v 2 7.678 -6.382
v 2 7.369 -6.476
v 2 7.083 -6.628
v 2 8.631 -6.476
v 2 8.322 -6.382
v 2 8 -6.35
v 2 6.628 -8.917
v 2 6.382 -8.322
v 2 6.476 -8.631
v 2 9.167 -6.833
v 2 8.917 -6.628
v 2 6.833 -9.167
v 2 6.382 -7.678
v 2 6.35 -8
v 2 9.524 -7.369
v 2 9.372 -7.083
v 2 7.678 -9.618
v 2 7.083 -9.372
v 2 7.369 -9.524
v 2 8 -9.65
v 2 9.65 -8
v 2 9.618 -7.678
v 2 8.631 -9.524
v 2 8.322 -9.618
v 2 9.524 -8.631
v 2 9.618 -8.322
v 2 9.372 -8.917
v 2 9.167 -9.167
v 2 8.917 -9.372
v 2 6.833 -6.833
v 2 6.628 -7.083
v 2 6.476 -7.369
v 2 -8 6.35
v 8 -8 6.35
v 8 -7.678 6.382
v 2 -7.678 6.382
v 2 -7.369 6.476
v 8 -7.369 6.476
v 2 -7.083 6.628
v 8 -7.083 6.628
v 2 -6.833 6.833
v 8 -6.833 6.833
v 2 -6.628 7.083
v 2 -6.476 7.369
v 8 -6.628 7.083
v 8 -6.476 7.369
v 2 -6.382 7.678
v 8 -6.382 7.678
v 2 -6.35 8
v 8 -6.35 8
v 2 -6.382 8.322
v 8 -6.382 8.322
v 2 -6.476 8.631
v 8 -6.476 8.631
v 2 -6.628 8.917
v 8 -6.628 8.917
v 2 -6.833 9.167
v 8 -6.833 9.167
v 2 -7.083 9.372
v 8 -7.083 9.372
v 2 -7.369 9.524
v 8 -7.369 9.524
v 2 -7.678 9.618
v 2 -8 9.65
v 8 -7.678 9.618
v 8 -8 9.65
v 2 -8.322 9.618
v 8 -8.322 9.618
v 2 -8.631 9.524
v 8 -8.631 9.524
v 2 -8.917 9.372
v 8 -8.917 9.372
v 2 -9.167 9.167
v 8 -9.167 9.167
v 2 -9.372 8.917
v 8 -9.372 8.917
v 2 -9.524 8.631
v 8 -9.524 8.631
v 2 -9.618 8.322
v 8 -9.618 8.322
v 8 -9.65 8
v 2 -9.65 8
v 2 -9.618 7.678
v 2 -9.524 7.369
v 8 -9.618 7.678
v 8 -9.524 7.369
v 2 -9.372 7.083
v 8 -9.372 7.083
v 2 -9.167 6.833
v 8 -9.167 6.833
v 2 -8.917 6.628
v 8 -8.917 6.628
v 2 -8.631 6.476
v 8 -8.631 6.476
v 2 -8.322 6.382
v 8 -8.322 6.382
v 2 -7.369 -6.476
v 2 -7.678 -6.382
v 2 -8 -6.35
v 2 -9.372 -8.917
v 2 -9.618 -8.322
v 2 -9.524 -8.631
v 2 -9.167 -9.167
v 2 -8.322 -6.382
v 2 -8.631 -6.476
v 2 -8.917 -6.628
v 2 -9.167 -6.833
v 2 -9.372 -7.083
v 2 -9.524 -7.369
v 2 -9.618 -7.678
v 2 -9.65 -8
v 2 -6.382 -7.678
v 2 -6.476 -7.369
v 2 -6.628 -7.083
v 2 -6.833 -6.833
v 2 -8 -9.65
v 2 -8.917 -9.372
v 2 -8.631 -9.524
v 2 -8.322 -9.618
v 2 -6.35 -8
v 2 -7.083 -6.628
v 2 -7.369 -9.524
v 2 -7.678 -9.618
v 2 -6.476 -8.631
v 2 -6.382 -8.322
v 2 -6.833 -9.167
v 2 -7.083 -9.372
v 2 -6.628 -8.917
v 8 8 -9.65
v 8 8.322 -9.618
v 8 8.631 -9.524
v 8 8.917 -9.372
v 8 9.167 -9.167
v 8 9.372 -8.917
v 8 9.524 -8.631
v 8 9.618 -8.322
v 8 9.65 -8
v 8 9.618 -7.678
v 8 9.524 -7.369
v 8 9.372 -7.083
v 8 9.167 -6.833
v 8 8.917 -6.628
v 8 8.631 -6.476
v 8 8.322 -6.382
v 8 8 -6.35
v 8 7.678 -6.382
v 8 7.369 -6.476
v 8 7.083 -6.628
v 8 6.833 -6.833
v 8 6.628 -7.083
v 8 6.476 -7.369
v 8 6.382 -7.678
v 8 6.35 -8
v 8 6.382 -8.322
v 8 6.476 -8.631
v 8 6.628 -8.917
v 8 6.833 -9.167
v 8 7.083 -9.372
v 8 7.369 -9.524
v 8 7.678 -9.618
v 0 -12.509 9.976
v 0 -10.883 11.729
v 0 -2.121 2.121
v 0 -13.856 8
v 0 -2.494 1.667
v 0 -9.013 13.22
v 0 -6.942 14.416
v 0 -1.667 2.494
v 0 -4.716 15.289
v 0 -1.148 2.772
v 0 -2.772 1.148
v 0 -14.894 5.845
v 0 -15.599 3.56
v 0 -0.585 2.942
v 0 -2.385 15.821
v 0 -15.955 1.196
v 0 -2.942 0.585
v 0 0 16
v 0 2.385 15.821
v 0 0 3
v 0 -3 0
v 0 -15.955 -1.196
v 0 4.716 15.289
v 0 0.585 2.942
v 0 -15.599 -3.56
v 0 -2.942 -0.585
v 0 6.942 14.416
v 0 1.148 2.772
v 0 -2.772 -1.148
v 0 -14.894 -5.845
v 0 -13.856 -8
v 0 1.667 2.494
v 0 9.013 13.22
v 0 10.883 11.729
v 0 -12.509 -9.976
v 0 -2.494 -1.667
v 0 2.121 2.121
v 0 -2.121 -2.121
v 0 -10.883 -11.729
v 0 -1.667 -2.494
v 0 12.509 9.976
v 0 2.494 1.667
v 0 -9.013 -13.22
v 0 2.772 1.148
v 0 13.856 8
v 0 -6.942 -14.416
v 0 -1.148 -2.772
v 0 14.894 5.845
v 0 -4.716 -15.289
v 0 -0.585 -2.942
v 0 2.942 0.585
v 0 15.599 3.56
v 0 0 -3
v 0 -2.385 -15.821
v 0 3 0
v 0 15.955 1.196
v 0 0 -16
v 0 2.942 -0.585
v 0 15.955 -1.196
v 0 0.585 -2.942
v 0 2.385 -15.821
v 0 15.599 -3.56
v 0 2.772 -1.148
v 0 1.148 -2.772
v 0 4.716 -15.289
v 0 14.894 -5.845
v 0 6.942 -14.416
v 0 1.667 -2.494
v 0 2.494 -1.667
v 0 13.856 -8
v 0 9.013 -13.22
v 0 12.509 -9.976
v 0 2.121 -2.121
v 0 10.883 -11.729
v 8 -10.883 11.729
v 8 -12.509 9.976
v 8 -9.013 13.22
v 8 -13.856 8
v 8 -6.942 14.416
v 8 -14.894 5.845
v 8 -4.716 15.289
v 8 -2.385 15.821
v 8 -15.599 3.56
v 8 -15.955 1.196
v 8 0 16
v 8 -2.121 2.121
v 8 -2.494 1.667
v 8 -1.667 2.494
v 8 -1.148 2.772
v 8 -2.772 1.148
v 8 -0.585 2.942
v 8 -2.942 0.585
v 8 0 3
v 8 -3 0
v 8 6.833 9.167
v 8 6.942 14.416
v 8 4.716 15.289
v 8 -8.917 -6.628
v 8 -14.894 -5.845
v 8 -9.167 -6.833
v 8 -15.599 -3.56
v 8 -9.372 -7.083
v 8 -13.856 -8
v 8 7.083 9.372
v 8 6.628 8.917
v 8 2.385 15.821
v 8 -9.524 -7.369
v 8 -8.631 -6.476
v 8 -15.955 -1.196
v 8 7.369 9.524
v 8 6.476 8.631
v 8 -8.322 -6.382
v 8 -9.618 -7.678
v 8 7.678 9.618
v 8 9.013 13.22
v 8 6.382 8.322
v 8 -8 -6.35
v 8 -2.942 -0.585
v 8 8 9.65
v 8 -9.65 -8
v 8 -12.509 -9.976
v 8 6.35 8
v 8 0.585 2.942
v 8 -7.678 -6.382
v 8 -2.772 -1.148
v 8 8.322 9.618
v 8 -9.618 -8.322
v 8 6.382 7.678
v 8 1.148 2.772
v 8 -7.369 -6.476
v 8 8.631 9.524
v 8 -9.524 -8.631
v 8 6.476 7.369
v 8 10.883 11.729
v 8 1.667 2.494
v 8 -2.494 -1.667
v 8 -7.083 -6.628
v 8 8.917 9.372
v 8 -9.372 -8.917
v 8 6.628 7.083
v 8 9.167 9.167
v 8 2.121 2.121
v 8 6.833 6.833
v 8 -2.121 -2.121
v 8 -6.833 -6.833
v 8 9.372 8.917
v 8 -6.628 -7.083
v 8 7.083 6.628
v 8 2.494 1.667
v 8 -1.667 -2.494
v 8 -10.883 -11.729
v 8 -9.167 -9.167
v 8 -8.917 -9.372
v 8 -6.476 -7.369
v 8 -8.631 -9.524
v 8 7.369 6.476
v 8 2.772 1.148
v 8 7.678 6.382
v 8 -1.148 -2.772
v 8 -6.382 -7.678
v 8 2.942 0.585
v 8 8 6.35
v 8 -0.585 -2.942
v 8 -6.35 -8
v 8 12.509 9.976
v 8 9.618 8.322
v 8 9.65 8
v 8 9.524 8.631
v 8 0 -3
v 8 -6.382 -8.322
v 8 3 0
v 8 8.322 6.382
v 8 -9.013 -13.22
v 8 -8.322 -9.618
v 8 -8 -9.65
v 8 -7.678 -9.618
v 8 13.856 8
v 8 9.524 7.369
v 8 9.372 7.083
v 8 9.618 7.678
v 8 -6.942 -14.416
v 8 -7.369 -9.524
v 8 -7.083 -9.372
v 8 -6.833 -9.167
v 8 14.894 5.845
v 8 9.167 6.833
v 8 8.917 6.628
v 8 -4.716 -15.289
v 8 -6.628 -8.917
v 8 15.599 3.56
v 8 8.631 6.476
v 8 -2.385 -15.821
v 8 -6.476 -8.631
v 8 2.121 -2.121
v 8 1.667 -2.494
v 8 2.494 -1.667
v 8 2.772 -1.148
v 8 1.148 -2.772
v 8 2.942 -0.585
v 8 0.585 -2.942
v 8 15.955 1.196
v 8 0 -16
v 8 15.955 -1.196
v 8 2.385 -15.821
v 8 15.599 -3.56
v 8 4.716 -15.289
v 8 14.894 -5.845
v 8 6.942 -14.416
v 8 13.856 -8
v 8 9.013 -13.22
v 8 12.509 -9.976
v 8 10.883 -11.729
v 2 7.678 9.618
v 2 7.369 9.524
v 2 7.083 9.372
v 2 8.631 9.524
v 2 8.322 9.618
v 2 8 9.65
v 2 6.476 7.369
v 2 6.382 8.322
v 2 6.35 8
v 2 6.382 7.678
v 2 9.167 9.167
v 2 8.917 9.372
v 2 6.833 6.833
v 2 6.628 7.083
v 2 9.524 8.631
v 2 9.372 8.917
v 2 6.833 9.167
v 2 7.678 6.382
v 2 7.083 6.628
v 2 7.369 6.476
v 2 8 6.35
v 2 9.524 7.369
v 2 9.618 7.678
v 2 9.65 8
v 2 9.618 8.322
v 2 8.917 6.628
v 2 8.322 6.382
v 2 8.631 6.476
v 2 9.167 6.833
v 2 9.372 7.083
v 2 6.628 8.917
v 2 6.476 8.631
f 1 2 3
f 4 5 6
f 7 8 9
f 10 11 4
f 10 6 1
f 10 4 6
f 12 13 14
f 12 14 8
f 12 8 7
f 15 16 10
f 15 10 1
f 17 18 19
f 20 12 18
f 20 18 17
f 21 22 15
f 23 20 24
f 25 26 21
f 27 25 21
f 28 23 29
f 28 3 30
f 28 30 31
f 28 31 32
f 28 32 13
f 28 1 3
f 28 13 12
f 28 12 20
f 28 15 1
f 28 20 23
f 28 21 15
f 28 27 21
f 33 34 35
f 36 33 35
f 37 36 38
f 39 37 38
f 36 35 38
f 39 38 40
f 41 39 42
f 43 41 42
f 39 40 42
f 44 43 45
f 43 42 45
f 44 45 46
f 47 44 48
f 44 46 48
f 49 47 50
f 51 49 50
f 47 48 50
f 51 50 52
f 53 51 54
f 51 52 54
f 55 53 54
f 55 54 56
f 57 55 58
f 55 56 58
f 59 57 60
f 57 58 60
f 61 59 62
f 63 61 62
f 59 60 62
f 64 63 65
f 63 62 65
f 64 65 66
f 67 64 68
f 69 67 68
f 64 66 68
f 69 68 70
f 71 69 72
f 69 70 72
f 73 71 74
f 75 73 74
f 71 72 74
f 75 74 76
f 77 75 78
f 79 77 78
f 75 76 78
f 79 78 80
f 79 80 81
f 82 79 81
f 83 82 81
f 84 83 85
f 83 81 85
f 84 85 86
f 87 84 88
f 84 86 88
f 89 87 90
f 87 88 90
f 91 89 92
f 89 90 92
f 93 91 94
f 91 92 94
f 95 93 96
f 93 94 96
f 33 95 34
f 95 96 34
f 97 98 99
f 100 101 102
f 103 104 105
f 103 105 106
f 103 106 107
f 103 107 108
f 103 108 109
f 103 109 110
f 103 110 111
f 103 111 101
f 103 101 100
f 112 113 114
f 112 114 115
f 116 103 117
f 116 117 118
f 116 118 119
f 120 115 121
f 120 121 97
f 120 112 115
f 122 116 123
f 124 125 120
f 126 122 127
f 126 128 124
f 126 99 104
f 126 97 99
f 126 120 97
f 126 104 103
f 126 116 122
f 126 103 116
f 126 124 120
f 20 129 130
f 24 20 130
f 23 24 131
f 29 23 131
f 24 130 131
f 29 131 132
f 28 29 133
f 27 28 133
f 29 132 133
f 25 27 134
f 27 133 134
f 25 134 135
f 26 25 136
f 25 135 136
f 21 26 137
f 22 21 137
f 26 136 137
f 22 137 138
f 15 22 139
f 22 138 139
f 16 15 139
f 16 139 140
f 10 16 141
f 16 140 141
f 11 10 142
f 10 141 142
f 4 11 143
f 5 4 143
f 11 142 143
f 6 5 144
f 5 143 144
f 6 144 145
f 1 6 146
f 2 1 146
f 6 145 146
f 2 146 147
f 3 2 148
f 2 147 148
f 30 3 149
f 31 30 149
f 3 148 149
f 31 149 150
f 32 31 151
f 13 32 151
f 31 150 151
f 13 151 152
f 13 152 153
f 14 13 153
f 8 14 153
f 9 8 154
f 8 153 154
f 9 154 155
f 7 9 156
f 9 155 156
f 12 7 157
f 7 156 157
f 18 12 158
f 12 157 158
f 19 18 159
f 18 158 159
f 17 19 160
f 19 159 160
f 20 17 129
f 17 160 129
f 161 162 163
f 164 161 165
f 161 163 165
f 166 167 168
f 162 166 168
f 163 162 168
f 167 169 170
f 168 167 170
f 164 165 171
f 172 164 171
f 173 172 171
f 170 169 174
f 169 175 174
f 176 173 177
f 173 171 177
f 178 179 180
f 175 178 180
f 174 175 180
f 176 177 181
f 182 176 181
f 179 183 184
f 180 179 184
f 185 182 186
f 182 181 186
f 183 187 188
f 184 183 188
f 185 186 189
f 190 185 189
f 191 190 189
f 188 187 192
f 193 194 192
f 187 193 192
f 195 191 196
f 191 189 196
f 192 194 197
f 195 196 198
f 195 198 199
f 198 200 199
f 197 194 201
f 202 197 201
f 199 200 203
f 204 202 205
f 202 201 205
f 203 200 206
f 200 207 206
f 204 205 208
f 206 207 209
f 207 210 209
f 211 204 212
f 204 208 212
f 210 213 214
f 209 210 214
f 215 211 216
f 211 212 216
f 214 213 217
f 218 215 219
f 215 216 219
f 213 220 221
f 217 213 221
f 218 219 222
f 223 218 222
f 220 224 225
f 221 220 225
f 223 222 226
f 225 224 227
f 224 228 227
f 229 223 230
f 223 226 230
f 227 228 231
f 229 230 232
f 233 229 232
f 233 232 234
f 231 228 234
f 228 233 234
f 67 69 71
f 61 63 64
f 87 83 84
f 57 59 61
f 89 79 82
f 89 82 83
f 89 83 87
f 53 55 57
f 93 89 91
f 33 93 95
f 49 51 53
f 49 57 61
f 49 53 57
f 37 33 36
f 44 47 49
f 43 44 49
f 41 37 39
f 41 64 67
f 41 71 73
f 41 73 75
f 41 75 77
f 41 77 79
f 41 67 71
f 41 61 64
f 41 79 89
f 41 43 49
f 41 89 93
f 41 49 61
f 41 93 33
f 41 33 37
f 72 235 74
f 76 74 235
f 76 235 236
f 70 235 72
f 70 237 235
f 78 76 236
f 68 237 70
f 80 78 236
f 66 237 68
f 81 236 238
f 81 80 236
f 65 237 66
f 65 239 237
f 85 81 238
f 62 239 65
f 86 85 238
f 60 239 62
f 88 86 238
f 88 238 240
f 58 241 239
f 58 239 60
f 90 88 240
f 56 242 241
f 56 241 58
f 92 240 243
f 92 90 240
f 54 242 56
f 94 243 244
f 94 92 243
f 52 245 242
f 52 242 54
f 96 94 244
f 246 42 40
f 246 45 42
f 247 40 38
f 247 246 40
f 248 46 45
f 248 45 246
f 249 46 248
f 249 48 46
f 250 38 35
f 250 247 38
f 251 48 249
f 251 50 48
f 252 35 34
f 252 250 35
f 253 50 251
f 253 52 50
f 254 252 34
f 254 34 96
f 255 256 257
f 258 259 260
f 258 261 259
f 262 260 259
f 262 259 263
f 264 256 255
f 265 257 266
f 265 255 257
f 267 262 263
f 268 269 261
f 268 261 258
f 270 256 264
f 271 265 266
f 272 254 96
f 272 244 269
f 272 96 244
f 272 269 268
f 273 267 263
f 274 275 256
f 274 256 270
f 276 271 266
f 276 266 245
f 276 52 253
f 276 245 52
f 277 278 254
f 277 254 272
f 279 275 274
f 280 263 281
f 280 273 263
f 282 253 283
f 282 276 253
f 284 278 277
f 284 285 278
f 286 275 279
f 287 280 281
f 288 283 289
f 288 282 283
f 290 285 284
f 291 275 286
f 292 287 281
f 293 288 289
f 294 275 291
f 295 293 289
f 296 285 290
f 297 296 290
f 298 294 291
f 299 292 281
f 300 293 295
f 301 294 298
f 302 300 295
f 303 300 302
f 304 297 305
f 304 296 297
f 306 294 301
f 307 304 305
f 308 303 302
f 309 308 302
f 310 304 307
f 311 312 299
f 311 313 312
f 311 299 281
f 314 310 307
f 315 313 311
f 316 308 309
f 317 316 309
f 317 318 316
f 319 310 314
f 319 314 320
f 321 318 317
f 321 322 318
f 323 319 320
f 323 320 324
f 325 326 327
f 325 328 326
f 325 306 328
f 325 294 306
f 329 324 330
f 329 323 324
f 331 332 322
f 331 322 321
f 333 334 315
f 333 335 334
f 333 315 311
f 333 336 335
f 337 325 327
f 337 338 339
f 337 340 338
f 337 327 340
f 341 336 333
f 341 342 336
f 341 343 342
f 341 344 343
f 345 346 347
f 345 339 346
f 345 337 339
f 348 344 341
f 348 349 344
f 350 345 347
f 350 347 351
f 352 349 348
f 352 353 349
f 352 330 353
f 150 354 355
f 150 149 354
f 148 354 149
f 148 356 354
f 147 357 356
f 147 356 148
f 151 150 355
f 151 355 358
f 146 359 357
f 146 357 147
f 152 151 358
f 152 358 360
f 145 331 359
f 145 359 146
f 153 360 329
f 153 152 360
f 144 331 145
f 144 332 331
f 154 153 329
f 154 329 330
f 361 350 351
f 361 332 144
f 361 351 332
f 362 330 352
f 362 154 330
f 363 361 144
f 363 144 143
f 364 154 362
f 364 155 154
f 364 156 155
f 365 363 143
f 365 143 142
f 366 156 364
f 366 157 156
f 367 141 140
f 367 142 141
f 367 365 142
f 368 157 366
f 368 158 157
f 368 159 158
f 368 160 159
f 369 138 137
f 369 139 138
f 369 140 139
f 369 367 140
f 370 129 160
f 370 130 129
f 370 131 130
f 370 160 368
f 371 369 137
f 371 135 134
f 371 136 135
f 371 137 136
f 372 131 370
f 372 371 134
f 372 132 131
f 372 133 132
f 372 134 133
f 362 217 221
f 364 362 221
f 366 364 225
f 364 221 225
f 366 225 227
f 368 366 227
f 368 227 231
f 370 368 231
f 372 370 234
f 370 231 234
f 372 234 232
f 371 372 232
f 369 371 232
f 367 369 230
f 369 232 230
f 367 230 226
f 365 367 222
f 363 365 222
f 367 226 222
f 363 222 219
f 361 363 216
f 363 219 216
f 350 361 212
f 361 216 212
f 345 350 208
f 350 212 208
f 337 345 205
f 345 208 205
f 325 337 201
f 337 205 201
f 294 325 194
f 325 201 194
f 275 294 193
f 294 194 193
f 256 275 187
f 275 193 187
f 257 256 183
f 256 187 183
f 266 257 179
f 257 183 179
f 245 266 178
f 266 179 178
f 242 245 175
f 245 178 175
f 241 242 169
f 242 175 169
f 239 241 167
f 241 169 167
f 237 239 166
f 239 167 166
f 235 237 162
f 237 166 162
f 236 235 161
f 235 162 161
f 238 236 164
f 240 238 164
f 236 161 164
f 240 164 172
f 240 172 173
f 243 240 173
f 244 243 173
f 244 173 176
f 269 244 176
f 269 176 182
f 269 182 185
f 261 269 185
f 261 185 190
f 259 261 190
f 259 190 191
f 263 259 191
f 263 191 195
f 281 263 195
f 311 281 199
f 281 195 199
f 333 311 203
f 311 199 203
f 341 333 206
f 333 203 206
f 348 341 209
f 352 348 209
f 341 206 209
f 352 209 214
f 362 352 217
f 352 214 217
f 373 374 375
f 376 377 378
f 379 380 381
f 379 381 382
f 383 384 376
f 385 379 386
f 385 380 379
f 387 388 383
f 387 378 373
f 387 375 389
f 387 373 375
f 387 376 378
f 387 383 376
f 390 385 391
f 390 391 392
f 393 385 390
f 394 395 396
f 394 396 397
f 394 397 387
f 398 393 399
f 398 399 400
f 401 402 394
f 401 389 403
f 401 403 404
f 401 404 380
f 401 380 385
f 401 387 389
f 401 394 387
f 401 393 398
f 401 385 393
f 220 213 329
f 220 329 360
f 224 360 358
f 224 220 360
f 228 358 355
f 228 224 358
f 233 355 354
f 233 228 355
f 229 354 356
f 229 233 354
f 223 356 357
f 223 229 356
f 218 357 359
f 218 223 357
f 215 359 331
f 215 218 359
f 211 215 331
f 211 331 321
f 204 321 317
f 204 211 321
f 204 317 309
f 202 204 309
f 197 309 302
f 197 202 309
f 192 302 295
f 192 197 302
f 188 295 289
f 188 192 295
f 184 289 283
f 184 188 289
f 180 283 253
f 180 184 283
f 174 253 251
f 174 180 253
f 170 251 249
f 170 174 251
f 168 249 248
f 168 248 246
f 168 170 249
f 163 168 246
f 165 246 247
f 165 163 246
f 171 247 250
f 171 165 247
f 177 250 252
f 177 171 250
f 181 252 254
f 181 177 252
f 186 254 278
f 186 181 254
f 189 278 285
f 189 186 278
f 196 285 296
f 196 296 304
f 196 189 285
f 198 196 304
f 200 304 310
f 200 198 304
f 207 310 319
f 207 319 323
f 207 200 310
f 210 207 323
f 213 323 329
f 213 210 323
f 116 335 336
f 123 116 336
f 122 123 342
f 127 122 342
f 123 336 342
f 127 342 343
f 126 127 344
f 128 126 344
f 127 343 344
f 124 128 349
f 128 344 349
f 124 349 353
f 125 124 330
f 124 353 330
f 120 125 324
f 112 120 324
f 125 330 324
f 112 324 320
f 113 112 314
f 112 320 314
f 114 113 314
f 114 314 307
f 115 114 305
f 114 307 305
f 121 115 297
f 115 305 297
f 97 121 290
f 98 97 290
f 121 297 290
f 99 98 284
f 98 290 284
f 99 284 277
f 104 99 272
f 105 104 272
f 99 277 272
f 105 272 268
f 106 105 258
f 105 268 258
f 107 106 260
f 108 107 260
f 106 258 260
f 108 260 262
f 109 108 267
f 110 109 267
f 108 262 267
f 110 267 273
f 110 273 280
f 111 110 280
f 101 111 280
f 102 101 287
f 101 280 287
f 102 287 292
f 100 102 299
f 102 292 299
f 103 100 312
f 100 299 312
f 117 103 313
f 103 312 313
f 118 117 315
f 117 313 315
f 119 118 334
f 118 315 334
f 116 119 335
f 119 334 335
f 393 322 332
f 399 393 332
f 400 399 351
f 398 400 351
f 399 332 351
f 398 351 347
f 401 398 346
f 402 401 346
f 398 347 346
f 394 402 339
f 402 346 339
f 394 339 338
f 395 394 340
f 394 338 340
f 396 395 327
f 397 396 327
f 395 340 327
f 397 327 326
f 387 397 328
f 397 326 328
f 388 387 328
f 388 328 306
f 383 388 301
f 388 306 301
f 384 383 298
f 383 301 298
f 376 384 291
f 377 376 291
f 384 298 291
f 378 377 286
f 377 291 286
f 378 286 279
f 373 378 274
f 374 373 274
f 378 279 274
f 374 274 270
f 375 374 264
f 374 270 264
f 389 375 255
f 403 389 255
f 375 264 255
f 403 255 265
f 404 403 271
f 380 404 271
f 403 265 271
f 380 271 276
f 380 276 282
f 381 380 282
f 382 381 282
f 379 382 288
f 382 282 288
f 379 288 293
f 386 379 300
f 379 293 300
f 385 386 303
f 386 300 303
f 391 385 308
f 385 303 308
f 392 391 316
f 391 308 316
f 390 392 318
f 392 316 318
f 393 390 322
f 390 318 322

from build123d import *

# Parameters (mm, degrees)
SK_BODY_R                = 16
EX_BODY_DEPTH            = 8
SK_BORE_R                = 3
CUT_BORE_DEPTH           = 8
SK_PATTERN16_4XM4_R      = 1.65
CUT_PATTERN16_4XM4_DEPTH = 6


with BuildPart() as part:
    # SK_Body → EX_Body (new body)
    with BuildSketch(Plane(origin=(0, 0, 0), x_dir=(0, 0, -1), z_dir=(1, 0, 0))):
        Circle(SK_BODY_R)
    extrude(amount=EX_BODY_DEPTH)

    # SK_Bore → CUT_Bore (cut)
    with BuildSketch(Plane(origin=(0, 0, 0), x_dir=(0, 0, -1), z_dir=(1, 0, 0))):
        Circle(SK_BORE_R)
    extrude(amount=CUT_BORE_DEPTH, mode=Mode.SUBTRACT)

    # SK_Pattern16_4xM4 → CUT_Pattern16_4xM4 (cut)
    with BuildSketch(Plane(origin=(8, 0, 0), x_dir=(0, 0, -1), z_dir=(1, 0, 0))):
        with Locations((-8, 8)):
            Circle(SK_PATTERN16_4XM4_R)
        with Locations((-8, -8)):
            Circle(SK_PATTERN16_4XM4_R)
        with Locations((8, 8)):
            Circle(SK_PATTERN16_4XM4_R)
        with Locations((8, -8)):
            Circle(SK_PATTERN16_4XM4_R)
    extrude(amount=-CUT_PATTERN16_4XM4_DEPTH, mode=Mode.SUBTRACT)


solid = part.part
